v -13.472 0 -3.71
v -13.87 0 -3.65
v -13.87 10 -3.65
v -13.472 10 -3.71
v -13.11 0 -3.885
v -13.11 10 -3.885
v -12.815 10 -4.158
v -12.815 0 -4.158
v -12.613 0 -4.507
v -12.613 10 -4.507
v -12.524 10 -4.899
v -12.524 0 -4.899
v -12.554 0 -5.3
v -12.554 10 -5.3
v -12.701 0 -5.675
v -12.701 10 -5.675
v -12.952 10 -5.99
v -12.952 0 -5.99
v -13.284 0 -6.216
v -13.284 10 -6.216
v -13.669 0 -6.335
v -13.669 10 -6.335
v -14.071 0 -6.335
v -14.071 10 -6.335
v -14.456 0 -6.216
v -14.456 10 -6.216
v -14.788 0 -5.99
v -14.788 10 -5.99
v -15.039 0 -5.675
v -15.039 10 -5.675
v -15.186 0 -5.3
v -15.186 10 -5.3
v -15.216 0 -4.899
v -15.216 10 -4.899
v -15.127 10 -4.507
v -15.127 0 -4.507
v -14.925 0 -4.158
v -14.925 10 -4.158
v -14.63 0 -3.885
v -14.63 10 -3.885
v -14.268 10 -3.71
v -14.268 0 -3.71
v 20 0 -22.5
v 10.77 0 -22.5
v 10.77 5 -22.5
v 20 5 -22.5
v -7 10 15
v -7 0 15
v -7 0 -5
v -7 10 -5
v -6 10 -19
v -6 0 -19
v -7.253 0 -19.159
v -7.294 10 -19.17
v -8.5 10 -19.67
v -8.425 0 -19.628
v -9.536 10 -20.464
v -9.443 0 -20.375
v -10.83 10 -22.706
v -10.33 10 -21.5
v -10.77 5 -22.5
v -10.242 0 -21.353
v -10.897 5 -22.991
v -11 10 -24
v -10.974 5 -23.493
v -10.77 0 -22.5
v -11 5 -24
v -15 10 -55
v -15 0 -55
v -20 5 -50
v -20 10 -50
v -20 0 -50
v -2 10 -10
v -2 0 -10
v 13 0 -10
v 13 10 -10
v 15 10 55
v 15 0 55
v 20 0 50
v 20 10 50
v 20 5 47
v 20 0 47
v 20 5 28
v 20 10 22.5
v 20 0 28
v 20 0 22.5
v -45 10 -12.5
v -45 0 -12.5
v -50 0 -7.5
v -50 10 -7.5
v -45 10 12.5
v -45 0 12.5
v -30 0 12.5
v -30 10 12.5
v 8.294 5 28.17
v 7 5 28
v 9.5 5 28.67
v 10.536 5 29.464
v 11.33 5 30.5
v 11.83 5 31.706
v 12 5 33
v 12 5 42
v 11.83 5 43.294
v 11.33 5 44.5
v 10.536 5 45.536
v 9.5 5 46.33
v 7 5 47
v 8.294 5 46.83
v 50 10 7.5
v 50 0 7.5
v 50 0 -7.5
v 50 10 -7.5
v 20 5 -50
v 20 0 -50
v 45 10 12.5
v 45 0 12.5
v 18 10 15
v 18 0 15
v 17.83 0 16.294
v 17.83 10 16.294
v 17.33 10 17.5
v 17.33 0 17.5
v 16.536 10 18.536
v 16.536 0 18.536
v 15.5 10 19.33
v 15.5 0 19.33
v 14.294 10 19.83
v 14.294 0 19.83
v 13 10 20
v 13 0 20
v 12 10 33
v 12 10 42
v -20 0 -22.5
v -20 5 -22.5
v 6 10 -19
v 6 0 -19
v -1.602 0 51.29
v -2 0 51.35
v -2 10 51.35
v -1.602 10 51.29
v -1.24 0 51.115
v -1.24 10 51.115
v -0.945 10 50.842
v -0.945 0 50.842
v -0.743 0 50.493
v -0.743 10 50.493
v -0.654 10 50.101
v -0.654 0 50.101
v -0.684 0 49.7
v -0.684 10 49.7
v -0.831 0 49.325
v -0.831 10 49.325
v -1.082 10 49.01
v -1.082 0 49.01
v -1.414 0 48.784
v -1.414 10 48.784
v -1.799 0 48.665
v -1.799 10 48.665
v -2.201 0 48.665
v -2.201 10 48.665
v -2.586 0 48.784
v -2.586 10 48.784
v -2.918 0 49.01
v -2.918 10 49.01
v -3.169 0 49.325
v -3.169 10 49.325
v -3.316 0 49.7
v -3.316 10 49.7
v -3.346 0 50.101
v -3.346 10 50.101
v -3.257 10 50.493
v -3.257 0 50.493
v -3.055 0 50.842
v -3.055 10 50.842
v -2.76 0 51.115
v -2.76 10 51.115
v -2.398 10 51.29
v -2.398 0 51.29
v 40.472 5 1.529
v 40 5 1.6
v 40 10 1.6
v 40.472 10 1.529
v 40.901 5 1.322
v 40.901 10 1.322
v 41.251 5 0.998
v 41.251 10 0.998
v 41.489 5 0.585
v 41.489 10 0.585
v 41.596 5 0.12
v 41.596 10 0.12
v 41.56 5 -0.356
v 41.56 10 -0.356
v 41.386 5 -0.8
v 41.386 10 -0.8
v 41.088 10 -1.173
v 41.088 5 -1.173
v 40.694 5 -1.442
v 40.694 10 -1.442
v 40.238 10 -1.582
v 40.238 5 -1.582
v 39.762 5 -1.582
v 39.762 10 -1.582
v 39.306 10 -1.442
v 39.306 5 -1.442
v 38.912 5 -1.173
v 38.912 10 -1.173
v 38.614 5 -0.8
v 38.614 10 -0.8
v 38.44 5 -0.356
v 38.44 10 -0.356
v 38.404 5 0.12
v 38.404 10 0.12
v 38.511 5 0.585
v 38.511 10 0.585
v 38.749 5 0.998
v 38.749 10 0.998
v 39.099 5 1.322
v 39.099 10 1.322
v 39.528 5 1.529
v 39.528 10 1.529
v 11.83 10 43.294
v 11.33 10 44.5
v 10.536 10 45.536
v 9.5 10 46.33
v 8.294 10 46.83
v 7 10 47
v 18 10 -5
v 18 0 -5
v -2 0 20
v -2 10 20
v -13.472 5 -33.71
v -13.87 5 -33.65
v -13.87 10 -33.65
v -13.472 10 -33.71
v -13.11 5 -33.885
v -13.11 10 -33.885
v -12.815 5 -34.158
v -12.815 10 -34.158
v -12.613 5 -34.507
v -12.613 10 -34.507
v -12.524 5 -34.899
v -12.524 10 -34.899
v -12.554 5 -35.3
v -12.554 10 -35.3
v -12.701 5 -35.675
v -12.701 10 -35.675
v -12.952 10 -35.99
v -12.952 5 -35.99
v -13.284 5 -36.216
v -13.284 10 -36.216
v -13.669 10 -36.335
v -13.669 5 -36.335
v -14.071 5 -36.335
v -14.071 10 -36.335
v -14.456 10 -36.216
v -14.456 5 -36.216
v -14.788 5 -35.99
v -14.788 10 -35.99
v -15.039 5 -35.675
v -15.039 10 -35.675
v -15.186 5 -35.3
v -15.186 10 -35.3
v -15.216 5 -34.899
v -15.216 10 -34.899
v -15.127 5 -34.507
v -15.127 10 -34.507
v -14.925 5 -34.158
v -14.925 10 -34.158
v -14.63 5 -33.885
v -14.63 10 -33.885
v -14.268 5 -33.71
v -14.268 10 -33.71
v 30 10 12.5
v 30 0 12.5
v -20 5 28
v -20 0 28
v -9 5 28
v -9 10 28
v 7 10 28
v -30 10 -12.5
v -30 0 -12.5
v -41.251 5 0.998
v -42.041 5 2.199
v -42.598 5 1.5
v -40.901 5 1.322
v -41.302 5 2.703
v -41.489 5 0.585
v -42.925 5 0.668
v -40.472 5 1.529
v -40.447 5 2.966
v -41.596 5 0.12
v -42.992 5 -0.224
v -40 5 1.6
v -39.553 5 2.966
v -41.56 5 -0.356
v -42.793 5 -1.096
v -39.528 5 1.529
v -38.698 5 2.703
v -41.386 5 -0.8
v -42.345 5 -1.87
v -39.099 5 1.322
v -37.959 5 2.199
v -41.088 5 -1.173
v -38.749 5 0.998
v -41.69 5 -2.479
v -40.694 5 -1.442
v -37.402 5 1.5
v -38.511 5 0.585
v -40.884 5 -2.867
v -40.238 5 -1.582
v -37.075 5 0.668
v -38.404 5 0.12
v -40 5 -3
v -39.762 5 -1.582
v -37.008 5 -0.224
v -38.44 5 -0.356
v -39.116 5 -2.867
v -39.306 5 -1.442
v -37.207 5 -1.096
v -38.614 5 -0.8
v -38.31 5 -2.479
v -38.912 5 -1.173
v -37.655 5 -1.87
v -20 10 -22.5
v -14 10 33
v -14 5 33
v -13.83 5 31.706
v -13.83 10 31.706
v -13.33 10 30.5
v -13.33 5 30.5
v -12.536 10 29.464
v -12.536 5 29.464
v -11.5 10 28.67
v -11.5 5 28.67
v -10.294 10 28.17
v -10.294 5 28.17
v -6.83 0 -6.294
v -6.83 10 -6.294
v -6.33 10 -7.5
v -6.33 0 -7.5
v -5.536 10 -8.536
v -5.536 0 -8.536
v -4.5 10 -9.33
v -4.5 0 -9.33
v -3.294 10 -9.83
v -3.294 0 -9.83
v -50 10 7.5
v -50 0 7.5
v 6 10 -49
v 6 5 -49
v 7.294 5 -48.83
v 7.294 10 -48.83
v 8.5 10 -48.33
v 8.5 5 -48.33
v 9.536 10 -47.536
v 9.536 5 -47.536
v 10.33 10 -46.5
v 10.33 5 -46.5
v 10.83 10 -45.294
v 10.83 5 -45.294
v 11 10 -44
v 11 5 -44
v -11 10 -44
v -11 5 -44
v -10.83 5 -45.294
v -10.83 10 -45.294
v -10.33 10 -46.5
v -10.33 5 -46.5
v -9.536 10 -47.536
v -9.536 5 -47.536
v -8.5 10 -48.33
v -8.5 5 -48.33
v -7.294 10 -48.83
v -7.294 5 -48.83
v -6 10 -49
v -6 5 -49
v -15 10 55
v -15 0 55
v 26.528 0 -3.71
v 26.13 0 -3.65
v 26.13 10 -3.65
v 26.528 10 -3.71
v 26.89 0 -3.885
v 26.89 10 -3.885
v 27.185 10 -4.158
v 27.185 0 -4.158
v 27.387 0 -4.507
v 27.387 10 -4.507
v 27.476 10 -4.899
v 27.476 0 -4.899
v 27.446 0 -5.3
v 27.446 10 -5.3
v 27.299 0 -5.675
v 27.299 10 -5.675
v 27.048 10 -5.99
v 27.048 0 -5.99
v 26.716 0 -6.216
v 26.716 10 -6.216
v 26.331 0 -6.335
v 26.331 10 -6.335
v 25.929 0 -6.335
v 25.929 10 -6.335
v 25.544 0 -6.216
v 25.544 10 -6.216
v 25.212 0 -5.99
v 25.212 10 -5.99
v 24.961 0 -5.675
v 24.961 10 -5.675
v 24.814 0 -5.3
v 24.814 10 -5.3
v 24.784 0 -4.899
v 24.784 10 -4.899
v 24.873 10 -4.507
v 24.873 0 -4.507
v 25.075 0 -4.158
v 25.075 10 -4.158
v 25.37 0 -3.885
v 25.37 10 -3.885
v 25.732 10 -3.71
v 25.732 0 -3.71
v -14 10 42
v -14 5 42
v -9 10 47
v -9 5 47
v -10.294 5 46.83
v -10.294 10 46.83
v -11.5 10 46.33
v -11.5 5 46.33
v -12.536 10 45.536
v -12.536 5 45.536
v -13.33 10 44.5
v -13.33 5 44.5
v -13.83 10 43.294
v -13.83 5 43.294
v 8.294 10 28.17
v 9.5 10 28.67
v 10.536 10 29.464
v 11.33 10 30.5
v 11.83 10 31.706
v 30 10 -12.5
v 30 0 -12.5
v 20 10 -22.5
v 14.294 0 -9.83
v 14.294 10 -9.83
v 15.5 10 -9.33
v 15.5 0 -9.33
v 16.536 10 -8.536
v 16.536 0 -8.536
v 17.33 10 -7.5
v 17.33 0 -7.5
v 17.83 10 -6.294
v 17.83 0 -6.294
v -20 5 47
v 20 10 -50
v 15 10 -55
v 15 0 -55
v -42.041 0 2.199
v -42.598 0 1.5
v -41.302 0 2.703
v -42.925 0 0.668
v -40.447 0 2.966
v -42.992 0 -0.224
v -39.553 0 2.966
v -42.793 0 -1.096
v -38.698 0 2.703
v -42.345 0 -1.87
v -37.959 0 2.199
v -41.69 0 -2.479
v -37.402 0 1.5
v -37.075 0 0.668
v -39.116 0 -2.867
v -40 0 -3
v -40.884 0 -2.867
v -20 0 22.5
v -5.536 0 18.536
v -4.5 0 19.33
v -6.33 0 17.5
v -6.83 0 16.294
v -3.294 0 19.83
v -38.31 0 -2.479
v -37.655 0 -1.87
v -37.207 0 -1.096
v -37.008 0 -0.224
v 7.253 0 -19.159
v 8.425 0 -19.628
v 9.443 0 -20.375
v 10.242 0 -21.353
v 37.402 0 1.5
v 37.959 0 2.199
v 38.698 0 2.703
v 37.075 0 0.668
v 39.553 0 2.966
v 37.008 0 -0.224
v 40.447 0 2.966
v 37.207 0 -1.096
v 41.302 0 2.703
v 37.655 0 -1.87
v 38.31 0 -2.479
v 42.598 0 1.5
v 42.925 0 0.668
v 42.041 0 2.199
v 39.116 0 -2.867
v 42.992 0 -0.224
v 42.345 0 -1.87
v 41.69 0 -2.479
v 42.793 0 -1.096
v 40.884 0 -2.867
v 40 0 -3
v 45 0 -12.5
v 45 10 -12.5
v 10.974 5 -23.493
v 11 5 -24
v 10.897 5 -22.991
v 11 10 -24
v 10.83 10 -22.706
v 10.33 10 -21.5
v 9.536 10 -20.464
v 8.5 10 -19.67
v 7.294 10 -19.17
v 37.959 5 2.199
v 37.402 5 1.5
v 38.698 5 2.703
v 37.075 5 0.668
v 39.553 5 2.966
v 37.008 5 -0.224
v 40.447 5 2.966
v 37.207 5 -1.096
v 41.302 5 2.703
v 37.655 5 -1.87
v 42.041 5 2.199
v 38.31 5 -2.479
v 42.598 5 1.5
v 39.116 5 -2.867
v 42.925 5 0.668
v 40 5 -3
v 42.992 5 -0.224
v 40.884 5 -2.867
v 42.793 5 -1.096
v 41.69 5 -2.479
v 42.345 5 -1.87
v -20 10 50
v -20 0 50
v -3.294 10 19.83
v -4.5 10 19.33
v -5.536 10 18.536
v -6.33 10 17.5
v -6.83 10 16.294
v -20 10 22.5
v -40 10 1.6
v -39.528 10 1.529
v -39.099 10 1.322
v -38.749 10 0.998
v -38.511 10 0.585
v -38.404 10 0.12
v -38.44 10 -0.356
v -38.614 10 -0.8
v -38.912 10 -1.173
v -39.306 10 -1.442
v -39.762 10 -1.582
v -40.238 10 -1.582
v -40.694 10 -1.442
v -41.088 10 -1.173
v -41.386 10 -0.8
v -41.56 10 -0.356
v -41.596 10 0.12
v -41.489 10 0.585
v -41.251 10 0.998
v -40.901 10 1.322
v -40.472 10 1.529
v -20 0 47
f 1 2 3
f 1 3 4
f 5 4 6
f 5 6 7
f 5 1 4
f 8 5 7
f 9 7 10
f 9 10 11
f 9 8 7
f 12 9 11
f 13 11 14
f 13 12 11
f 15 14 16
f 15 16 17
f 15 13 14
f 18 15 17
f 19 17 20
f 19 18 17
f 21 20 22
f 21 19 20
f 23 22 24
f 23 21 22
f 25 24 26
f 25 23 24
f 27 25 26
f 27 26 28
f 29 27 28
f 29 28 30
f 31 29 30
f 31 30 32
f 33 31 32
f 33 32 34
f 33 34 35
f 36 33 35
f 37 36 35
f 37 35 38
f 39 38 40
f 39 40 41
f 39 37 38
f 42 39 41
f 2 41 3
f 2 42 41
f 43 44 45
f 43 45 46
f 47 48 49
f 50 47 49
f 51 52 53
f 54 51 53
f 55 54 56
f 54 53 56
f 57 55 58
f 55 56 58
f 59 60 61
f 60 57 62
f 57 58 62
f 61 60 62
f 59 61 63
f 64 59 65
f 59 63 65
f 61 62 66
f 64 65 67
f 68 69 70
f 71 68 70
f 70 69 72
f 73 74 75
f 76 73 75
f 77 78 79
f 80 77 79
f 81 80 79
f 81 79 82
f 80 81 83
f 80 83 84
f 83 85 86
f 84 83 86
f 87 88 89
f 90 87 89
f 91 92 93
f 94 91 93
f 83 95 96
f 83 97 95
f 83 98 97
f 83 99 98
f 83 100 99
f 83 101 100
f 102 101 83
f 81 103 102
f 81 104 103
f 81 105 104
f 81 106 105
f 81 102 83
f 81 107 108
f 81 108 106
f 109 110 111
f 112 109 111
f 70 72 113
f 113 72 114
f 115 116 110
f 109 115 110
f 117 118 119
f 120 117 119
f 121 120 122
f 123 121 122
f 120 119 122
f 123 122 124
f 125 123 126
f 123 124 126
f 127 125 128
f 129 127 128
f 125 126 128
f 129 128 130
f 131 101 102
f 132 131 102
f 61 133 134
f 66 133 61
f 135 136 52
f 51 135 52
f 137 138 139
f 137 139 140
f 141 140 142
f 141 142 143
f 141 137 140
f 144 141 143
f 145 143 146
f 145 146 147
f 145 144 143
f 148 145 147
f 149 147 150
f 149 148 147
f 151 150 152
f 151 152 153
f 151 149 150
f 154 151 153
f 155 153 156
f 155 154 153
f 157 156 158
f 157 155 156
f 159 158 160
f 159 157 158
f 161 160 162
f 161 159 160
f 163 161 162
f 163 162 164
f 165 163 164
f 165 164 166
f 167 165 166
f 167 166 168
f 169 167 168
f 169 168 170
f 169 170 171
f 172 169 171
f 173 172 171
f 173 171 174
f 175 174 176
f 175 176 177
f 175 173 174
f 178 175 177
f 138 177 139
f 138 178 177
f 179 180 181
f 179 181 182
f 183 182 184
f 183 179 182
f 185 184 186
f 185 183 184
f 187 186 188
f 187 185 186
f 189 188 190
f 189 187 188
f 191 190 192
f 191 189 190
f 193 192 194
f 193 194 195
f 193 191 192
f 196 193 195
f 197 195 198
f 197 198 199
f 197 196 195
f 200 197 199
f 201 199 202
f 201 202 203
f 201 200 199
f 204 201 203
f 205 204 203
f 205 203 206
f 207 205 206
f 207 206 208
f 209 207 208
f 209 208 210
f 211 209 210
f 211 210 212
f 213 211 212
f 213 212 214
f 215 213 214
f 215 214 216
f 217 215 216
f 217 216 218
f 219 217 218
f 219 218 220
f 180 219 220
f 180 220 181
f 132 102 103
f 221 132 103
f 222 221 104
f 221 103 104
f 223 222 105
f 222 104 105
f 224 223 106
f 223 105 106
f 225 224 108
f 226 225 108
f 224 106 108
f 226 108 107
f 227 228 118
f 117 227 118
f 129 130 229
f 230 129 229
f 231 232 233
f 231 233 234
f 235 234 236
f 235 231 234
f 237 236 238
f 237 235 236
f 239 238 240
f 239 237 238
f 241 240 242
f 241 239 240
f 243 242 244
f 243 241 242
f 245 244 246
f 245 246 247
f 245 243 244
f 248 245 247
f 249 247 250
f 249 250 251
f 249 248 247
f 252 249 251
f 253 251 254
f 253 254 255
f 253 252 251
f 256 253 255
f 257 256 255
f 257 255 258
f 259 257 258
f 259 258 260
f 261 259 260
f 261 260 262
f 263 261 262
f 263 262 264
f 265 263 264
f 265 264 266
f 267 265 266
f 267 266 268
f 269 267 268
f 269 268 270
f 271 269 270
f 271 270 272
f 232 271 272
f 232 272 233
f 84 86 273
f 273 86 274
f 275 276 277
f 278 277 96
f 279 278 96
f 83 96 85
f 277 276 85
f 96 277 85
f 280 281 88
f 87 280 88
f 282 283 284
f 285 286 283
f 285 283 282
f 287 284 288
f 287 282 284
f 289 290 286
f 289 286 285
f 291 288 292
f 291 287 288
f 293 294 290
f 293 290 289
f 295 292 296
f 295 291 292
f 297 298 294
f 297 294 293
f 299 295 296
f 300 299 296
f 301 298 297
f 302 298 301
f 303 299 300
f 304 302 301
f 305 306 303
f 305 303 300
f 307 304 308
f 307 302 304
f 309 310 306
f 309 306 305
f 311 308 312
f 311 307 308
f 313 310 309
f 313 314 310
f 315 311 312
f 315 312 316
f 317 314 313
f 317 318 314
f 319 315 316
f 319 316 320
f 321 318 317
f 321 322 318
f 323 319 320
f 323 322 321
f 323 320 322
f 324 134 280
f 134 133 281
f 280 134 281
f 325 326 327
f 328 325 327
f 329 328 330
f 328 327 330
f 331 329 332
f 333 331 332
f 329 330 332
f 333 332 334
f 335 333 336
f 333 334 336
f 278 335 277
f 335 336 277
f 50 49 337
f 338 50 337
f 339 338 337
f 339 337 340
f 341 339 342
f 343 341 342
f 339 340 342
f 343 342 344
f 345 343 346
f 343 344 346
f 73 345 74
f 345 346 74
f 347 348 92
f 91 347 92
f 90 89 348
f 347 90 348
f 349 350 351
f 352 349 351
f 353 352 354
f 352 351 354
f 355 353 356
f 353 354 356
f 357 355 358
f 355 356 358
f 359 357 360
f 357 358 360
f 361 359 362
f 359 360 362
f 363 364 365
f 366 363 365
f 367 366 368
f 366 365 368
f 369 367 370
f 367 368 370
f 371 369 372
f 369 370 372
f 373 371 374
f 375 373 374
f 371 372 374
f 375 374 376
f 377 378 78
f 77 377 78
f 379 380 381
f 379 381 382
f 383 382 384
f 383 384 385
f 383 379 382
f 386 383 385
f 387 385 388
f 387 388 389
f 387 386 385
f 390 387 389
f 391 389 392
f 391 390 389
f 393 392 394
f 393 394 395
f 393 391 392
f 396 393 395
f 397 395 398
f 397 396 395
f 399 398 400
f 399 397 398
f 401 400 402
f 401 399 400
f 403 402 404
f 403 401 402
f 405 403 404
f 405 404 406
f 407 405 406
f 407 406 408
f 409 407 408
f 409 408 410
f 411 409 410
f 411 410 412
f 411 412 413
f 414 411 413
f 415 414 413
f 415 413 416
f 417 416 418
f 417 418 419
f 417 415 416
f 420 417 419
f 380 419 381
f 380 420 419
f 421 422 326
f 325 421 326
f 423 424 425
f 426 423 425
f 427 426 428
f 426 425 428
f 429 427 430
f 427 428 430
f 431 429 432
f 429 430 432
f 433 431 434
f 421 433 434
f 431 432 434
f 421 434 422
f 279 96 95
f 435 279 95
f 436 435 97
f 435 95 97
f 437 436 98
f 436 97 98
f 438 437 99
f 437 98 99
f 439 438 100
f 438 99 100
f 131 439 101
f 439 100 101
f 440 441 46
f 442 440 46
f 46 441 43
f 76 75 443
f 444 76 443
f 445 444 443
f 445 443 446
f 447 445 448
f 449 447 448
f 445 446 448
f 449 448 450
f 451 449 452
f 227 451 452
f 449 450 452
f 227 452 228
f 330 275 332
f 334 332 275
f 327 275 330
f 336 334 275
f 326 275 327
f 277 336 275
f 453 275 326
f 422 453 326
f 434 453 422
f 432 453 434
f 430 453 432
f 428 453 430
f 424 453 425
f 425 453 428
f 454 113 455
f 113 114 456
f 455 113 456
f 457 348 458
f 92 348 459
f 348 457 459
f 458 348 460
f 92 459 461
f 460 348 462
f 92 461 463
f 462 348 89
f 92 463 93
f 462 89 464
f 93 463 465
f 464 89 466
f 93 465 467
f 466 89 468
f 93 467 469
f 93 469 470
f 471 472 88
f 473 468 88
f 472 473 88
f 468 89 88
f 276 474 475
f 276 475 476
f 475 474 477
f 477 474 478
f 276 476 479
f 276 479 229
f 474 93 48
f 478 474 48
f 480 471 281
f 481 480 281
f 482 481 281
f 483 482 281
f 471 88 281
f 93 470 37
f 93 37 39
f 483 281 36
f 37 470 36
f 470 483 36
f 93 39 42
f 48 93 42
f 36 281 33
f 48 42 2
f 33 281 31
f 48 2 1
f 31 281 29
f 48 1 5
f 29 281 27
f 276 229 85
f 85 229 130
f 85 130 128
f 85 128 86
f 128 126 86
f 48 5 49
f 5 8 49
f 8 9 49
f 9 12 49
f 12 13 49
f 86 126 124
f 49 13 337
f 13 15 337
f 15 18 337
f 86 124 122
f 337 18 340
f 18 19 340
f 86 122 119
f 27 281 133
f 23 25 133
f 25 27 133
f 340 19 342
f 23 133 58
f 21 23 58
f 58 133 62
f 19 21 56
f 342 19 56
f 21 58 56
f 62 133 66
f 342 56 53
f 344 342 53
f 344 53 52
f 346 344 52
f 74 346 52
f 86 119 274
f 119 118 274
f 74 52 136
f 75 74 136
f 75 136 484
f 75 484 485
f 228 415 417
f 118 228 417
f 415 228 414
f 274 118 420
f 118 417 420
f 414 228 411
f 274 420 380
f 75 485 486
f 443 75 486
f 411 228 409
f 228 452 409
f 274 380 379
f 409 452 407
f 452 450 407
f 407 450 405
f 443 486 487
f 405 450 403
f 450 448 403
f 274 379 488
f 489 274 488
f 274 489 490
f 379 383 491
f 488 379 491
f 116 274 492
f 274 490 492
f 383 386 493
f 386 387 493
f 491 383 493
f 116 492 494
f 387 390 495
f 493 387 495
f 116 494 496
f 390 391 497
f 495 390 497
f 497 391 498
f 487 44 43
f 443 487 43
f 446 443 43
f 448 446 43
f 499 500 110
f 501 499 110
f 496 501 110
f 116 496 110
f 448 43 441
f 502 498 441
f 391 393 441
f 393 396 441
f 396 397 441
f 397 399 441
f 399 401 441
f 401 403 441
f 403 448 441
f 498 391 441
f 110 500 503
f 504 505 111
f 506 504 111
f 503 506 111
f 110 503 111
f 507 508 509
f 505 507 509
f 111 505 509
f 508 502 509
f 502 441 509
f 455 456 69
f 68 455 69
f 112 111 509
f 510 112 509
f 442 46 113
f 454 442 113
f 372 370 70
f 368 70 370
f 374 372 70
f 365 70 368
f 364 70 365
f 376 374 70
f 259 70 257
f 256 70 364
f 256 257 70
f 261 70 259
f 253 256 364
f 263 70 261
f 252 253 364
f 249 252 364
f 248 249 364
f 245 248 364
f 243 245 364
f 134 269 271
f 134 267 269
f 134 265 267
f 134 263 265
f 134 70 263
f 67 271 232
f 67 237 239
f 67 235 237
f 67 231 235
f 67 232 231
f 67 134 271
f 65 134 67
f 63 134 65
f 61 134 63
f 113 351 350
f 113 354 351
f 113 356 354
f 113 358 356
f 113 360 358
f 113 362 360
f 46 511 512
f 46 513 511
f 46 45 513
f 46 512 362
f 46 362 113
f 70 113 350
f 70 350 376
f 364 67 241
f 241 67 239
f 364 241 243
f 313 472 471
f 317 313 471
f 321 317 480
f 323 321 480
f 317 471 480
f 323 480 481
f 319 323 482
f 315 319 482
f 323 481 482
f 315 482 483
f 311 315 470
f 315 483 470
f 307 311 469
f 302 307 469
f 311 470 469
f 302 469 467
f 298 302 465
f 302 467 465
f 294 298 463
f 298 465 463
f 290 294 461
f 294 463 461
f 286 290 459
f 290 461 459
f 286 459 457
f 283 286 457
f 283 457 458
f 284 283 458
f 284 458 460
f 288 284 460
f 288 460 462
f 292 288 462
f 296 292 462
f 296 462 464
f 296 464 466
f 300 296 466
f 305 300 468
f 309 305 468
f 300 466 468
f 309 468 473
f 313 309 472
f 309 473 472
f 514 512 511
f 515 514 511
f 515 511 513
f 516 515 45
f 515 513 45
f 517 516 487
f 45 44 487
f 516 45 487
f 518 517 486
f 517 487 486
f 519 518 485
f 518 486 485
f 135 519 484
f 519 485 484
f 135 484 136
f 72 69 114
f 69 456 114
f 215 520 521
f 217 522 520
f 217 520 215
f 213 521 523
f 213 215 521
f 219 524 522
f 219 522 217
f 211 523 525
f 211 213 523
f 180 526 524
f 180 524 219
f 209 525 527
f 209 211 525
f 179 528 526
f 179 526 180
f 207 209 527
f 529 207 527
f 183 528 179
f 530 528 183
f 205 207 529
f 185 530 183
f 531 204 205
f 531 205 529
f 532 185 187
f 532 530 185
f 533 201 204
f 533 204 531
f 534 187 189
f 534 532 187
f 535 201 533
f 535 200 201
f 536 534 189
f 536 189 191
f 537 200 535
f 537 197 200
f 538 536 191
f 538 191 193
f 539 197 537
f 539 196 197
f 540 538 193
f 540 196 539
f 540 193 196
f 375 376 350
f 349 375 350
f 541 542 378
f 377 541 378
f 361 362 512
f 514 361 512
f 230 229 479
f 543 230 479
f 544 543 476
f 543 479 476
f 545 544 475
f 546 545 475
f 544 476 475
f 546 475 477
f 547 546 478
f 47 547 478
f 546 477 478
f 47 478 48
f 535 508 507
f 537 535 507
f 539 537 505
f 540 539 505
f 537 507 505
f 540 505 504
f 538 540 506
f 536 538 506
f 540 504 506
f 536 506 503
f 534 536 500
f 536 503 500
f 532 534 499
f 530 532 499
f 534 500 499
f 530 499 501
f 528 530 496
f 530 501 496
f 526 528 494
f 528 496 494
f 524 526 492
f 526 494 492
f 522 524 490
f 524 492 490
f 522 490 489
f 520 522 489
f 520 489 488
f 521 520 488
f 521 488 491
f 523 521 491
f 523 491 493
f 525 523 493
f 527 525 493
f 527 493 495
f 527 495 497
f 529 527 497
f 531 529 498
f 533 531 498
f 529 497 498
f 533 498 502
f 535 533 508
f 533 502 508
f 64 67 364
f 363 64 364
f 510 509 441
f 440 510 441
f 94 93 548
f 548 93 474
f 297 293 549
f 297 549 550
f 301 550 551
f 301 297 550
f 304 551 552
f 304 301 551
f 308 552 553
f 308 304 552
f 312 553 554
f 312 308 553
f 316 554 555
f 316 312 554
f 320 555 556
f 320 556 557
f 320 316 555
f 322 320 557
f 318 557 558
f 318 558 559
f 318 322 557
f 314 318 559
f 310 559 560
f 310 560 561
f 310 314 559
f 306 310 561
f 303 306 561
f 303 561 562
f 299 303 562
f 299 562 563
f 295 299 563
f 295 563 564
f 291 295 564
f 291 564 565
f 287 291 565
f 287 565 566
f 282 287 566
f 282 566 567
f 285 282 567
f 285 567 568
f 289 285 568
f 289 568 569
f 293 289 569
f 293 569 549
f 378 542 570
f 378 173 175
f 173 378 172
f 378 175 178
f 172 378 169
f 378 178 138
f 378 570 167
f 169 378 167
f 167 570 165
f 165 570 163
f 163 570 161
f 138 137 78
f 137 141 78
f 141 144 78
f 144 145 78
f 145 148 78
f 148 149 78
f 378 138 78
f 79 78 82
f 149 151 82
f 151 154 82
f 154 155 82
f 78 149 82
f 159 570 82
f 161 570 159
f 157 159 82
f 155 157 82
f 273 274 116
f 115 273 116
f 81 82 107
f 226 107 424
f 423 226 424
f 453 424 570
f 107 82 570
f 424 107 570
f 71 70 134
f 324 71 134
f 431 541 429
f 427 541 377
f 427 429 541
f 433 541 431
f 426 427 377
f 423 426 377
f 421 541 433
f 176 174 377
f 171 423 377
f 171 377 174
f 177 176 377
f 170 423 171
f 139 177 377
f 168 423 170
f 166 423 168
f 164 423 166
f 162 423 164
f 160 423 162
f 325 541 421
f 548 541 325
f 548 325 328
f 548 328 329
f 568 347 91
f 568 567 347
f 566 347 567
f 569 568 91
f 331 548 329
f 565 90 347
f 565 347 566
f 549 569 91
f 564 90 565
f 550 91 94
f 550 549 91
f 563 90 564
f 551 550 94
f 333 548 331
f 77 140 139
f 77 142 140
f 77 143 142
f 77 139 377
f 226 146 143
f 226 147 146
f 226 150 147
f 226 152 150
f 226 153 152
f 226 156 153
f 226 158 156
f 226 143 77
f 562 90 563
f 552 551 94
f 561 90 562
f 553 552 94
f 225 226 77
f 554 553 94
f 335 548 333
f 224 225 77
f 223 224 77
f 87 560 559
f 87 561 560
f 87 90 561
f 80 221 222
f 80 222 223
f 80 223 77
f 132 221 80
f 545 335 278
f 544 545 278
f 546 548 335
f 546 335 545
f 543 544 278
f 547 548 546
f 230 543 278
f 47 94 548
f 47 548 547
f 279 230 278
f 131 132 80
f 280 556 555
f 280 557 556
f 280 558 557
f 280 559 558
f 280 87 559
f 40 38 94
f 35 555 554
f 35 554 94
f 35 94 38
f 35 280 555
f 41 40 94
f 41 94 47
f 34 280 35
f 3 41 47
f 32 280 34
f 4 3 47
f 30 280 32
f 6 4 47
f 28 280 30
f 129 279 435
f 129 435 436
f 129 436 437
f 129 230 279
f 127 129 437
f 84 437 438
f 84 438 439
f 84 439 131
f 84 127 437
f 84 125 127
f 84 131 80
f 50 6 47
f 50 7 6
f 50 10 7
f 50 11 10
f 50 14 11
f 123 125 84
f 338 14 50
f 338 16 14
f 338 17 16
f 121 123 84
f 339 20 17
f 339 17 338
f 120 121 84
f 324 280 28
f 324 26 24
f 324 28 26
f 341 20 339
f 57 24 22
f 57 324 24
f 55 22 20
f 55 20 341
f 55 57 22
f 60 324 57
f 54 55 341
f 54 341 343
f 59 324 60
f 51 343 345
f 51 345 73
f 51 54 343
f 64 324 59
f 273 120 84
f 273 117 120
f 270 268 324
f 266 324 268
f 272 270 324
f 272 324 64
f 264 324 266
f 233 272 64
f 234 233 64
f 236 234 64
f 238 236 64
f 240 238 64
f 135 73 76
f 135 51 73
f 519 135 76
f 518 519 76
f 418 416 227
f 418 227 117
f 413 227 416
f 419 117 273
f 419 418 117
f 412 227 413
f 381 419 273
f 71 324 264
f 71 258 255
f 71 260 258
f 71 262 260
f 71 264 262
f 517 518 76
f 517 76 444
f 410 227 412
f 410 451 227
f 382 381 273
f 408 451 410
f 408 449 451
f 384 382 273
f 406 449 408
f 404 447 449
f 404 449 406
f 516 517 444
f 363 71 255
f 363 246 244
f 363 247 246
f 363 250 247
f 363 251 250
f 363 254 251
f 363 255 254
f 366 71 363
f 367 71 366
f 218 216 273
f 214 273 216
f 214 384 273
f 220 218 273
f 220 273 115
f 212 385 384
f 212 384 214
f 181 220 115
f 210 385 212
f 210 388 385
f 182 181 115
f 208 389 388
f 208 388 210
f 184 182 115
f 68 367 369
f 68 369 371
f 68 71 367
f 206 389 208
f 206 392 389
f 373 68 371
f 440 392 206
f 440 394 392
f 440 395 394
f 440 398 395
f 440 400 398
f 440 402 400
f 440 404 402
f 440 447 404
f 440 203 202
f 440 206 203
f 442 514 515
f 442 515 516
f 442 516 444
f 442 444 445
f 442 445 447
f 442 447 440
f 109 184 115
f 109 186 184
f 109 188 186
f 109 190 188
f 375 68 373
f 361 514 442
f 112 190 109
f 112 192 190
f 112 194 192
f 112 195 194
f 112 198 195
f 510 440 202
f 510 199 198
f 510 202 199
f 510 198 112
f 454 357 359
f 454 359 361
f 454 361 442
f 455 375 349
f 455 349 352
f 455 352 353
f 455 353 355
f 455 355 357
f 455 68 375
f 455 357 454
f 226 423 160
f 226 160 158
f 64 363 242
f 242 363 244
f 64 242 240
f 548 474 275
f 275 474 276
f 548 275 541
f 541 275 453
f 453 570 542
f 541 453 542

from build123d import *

# Parameters (mm, degrees)
SKETCH_1_R          = 1.6
SKETCH_1_R_2        = 1.35
EXTRUDE_1_DEPTH     = 10
SKETCH_2_R          = 3
CUT_EXTRUDE_1_DEPTH = 5
SKETCH_3_W          = 40
SKETCH_3_H          = 19
SKETCH_3_H_2        = 27.5
CUT_EXTRUDE_2_DEPTH = 5


with BuildPart() as part:
    # 草图1 → 凸台-拉伸1 (new body)
    with BuildSketch(Plane(origin=(0, 0, 0), x_dir=(1, 0, 0), z_dir=(0, 1, 0))):
        Polygon((-50, 7.5), (-50, -7.5), (-45, -12.5), (-30, -12.5), (-20, -22.5), (-20, -50), (-15, -55), (15, -55), (20, -50), (20, -22.5), (30, -12.5), (45, -12.5), (50, -7.5), (50, 7.5), (45, 12.5), (30, 12.5), (20, 22.5), (20, 50), (15, 55), (-15, 55), (-20, 50), (-20, 22.5), (-30, 12.5), (-45, 12.5), align=None)
        with Locations(Location((40, 0, 0), (0, 0, 270))):
            Circle(SKETCH_1_R, mode=Mode.SUBTRACT)
        with Locations(Location((-40, 0, 0), (0, 0, 270))):
            Circle(SKETCH_1_R, mode=Mode.SUBTRACT)
        with Locations(Location((-2, -50, 0), (0, 0, 270))):
            Circle(SKETCH_1_R_2, mode=Mode.SUBTRACT)
        with Locations(Location((-13.87, 5, 0), (0, 0, 270))):
            Circle(SKETCH_1_R_2, mode=Mode.SUBTRACT)
        with Locations(Location((26.13, 5, 0), (0, 0, 270))):
            Circle(SKETCH_1_R_2, mode=Mode.SUBTRACT)
        with Locations(Location((-13.87, 35, 0), (0, 0, 270))):
            Circle(SKETCH_1_R_2, mode=Mode.SUBTRACT)
        with BuildLine():
            Line((-6, 49), (6, 49))
            ThreePointArc((6, 49), (9.535533906, 47.535533906), (11, 44))
            Line((11, 44), (11, 24))
            ThreePointArc((11, 24), (9.535533906, 20.464466094), (6, 19))
            Line((6, 19), (-6, 19))
            ThreePointArc((-6, 19), (-9.535533906, 20.464466094), (-11, 24))
            Line((-11, 24), (-11, 44))
            ThreePointArc((-11, 44), (-9.535533906, 47.535533906), (-6, 49))
        make_face(mode=Mode.SUBTRACT)
        with BuildLine():
            Line((-9, -28), (7, -28))
            ThreePointArc((7, -28), (10.535533906, -29.464466094), (12, -33))
            Line((12, -33), (12, -42))
            ThreePointArc((12, -42), (10.535533906, -45.535533906), (7, -47))
            Line((7, -47), (-9, -47))
            ThreePointArc((-9, -47), (-12.535533906, -45.535533906), (-14, -42))
            Line((-14, -42), (-14, -33))
            ThreePointArc((-14, -33), (-12.535533906, -29.464466094), (-9, -28))
        make_face(mode=Mode.SUBTRACT)
        with BuildLine():
            Line((-2, 10), (13, 10))
            ThreePointArc((13, 10), (16.535533906, 8.535533906), (18, 5))
            Line((18, 5), (18, -15))
            ThreePointArc((18, -15), (16.535533906, -18.535533906), (13, -20))
            Line((13, -20), (-2, -20))
            ThreePointArc((-2, -20), (-5.535533906, -18.535533906), (-7, -15))
            Line((-7, -15), (-7, 5))
            ThreePointArc((-7, 5), (-5.535533906, 8.535533906), (-2, 10))
        make_face(mode=Mode.SUBTRACT)
    extrude(amount=EXTRUDE_1_DEPTH)

    # 草图2 → 切除-拉伸1 (cut)
    with BuildSketch(Plane.XZ):
        with Locations(Location((-40, 0, 0), (0, 0, 270))):
            Circle(SKETCH_2_R)
        with Locations(Location((40, 0, 0), (0, 0, 270))):
            Circle(SKETCH_2_R)
    extrude(amount=-CUT_EXTRUDE_1_DEPTH, mode=Mode.SUBTRACT)

    # 草图3 → 切除-拉伸2 (cut)
    with BuildSketch(Plane.XZ):
        with Locations((0, 37.5)):
            Rectangle(SKETCH_3_W, SKETCH_3_H)
        with Locations((0, -36.25)):
            Rectangle(SKETCH_3_W, SKETCH_3_H_2)
    extrude(amount=-CUT_EXTRUDE_2_DEPTH, mode=Mode.SUBTRACT)


solid = part.part
